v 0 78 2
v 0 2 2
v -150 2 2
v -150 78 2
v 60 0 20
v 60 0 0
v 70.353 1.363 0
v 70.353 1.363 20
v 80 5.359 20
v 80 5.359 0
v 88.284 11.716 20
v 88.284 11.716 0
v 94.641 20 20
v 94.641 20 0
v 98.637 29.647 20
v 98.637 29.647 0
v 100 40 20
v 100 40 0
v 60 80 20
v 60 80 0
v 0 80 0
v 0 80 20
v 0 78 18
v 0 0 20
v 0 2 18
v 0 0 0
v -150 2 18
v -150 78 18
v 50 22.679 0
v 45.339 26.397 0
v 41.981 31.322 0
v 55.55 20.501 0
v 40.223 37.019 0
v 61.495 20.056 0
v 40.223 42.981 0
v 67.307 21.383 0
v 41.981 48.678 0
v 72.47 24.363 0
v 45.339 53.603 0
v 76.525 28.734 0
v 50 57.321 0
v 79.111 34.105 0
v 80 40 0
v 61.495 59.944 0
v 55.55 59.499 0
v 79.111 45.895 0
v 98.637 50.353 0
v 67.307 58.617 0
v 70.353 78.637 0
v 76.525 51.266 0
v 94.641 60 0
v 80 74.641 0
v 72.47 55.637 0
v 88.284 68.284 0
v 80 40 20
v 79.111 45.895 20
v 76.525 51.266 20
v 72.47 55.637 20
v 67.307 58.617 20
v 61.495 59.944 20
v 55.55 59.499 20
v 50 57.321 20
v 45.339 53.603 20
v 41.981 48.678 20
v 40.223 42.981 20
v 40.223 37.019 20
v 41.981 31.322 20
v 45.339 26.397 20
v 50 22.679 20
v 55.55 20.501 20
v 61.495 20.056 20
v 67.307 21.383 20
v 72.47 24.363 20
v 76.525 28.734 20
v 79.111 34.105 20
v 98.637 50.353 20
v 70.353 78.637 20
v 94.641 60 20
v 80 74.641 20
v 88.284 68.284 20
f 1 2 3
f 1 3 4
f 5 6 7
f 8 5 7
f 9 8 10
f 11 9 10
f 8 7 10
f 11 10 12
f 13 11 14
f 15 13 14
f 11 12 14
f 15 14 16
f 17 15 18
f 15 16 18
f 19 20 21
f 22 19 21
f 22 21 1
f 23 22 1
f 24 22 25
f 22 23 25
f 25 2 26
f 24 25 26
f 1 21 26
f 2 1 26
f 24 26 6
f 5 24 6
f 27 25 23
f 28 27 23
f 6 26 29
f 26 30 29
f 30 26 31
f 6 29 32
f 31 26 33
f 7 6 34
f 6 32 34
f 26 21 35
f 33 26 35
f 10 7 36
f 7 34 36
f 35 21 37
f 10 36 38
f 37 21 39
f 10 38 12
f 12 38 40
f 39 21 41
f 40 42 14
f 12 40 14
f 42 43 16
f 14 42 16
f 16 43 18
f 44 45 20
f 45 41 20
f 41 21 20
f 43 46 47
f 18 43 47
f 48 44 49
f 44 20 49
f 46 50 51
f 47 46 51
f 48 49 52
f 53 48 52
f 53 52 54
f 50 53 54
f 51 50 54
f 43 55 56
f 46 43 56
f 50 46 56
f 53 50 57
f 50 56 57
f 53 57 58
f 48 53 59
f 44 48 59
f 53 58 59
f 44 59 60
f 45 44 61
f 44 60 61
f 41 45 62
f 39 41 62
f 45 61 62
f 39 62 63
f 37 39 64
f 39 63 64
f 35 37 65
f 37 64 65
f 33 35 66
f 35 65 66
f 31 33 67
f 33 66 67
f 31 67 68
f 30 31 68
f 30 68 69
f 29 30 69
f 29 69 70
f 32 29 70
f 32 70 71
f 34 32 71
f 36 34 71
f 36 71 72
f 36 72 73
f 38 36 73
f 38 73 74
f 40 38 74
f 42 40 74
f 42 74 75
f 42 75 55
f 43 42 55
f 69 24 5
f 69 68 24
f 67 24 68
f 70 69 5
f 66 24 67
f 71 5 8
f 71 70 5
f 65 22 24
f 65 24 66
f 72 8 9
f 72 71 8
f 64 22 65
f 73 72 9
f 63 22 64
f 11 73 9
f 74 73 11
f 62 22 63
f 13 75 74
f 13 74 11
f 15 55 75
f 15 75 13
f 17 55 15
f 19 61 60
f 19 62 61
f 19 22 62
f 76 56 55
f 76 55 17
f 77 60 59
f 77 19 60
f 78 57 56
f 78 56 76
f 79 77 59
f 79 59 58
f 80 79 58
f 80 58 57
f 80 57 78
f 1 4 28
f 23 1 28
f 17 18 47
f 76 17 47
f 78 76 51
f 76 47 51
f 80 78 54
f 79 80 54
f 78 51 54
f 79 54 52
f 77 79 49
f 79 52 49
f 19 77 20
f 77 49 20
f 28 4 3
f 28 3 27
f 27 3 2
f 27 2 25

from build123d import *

# Parameters (mm, degrees)
BOSS_EXTRUDE1_DEPTH = 20
SKETCH2_R           = 20
CUT_EXTRUDE1_DEPTH  = 21
SKETCH3_W           = 16
SKETCH3_H           = 76
BOSS_EXTRUDE2_DEPTH = 150


with BuildPart() as part:
    # Sketch1 → Boss-Extrude1 (new body)
    with BuildSketch(Plane.XY):
        with BuildLine():
            Line((0, 80), (0, 0))
            Line((0, 0), (60, 0))
            ThreePointArc((60, 0), (88.284271247, 11.715728753), (100, 40))
            ThreePointArc((100, 40), (88.284271247, 68.284271247), (60, 80))
            Line((60, 80), (0, 80))
        make_face()
    extrude(amount=BOSS_EXTRUDE1_DEPTH)

    # Sketch2 → Cut-Extrude1 (cut, through all)
    with BuildSketch(Plane.XY.offset(20)):
        with Locations((60, 40)):
            Circle(SKETCH2_R)
    extrude(amount=-CUT_EXTRUDE1_DEPTH, mode=Mode.SUBTRACT)

    # Sketch3 → Boss-Extrude2 (add)
    with BuildSketch(Plane.ZY):
        with Locations((10, 40)):
            Rectangle(SKETCH3_W, SKETCH3_H)
    extrude(amount=BOSS_EXTRUDE2_DEPTH)


solid = part.part
